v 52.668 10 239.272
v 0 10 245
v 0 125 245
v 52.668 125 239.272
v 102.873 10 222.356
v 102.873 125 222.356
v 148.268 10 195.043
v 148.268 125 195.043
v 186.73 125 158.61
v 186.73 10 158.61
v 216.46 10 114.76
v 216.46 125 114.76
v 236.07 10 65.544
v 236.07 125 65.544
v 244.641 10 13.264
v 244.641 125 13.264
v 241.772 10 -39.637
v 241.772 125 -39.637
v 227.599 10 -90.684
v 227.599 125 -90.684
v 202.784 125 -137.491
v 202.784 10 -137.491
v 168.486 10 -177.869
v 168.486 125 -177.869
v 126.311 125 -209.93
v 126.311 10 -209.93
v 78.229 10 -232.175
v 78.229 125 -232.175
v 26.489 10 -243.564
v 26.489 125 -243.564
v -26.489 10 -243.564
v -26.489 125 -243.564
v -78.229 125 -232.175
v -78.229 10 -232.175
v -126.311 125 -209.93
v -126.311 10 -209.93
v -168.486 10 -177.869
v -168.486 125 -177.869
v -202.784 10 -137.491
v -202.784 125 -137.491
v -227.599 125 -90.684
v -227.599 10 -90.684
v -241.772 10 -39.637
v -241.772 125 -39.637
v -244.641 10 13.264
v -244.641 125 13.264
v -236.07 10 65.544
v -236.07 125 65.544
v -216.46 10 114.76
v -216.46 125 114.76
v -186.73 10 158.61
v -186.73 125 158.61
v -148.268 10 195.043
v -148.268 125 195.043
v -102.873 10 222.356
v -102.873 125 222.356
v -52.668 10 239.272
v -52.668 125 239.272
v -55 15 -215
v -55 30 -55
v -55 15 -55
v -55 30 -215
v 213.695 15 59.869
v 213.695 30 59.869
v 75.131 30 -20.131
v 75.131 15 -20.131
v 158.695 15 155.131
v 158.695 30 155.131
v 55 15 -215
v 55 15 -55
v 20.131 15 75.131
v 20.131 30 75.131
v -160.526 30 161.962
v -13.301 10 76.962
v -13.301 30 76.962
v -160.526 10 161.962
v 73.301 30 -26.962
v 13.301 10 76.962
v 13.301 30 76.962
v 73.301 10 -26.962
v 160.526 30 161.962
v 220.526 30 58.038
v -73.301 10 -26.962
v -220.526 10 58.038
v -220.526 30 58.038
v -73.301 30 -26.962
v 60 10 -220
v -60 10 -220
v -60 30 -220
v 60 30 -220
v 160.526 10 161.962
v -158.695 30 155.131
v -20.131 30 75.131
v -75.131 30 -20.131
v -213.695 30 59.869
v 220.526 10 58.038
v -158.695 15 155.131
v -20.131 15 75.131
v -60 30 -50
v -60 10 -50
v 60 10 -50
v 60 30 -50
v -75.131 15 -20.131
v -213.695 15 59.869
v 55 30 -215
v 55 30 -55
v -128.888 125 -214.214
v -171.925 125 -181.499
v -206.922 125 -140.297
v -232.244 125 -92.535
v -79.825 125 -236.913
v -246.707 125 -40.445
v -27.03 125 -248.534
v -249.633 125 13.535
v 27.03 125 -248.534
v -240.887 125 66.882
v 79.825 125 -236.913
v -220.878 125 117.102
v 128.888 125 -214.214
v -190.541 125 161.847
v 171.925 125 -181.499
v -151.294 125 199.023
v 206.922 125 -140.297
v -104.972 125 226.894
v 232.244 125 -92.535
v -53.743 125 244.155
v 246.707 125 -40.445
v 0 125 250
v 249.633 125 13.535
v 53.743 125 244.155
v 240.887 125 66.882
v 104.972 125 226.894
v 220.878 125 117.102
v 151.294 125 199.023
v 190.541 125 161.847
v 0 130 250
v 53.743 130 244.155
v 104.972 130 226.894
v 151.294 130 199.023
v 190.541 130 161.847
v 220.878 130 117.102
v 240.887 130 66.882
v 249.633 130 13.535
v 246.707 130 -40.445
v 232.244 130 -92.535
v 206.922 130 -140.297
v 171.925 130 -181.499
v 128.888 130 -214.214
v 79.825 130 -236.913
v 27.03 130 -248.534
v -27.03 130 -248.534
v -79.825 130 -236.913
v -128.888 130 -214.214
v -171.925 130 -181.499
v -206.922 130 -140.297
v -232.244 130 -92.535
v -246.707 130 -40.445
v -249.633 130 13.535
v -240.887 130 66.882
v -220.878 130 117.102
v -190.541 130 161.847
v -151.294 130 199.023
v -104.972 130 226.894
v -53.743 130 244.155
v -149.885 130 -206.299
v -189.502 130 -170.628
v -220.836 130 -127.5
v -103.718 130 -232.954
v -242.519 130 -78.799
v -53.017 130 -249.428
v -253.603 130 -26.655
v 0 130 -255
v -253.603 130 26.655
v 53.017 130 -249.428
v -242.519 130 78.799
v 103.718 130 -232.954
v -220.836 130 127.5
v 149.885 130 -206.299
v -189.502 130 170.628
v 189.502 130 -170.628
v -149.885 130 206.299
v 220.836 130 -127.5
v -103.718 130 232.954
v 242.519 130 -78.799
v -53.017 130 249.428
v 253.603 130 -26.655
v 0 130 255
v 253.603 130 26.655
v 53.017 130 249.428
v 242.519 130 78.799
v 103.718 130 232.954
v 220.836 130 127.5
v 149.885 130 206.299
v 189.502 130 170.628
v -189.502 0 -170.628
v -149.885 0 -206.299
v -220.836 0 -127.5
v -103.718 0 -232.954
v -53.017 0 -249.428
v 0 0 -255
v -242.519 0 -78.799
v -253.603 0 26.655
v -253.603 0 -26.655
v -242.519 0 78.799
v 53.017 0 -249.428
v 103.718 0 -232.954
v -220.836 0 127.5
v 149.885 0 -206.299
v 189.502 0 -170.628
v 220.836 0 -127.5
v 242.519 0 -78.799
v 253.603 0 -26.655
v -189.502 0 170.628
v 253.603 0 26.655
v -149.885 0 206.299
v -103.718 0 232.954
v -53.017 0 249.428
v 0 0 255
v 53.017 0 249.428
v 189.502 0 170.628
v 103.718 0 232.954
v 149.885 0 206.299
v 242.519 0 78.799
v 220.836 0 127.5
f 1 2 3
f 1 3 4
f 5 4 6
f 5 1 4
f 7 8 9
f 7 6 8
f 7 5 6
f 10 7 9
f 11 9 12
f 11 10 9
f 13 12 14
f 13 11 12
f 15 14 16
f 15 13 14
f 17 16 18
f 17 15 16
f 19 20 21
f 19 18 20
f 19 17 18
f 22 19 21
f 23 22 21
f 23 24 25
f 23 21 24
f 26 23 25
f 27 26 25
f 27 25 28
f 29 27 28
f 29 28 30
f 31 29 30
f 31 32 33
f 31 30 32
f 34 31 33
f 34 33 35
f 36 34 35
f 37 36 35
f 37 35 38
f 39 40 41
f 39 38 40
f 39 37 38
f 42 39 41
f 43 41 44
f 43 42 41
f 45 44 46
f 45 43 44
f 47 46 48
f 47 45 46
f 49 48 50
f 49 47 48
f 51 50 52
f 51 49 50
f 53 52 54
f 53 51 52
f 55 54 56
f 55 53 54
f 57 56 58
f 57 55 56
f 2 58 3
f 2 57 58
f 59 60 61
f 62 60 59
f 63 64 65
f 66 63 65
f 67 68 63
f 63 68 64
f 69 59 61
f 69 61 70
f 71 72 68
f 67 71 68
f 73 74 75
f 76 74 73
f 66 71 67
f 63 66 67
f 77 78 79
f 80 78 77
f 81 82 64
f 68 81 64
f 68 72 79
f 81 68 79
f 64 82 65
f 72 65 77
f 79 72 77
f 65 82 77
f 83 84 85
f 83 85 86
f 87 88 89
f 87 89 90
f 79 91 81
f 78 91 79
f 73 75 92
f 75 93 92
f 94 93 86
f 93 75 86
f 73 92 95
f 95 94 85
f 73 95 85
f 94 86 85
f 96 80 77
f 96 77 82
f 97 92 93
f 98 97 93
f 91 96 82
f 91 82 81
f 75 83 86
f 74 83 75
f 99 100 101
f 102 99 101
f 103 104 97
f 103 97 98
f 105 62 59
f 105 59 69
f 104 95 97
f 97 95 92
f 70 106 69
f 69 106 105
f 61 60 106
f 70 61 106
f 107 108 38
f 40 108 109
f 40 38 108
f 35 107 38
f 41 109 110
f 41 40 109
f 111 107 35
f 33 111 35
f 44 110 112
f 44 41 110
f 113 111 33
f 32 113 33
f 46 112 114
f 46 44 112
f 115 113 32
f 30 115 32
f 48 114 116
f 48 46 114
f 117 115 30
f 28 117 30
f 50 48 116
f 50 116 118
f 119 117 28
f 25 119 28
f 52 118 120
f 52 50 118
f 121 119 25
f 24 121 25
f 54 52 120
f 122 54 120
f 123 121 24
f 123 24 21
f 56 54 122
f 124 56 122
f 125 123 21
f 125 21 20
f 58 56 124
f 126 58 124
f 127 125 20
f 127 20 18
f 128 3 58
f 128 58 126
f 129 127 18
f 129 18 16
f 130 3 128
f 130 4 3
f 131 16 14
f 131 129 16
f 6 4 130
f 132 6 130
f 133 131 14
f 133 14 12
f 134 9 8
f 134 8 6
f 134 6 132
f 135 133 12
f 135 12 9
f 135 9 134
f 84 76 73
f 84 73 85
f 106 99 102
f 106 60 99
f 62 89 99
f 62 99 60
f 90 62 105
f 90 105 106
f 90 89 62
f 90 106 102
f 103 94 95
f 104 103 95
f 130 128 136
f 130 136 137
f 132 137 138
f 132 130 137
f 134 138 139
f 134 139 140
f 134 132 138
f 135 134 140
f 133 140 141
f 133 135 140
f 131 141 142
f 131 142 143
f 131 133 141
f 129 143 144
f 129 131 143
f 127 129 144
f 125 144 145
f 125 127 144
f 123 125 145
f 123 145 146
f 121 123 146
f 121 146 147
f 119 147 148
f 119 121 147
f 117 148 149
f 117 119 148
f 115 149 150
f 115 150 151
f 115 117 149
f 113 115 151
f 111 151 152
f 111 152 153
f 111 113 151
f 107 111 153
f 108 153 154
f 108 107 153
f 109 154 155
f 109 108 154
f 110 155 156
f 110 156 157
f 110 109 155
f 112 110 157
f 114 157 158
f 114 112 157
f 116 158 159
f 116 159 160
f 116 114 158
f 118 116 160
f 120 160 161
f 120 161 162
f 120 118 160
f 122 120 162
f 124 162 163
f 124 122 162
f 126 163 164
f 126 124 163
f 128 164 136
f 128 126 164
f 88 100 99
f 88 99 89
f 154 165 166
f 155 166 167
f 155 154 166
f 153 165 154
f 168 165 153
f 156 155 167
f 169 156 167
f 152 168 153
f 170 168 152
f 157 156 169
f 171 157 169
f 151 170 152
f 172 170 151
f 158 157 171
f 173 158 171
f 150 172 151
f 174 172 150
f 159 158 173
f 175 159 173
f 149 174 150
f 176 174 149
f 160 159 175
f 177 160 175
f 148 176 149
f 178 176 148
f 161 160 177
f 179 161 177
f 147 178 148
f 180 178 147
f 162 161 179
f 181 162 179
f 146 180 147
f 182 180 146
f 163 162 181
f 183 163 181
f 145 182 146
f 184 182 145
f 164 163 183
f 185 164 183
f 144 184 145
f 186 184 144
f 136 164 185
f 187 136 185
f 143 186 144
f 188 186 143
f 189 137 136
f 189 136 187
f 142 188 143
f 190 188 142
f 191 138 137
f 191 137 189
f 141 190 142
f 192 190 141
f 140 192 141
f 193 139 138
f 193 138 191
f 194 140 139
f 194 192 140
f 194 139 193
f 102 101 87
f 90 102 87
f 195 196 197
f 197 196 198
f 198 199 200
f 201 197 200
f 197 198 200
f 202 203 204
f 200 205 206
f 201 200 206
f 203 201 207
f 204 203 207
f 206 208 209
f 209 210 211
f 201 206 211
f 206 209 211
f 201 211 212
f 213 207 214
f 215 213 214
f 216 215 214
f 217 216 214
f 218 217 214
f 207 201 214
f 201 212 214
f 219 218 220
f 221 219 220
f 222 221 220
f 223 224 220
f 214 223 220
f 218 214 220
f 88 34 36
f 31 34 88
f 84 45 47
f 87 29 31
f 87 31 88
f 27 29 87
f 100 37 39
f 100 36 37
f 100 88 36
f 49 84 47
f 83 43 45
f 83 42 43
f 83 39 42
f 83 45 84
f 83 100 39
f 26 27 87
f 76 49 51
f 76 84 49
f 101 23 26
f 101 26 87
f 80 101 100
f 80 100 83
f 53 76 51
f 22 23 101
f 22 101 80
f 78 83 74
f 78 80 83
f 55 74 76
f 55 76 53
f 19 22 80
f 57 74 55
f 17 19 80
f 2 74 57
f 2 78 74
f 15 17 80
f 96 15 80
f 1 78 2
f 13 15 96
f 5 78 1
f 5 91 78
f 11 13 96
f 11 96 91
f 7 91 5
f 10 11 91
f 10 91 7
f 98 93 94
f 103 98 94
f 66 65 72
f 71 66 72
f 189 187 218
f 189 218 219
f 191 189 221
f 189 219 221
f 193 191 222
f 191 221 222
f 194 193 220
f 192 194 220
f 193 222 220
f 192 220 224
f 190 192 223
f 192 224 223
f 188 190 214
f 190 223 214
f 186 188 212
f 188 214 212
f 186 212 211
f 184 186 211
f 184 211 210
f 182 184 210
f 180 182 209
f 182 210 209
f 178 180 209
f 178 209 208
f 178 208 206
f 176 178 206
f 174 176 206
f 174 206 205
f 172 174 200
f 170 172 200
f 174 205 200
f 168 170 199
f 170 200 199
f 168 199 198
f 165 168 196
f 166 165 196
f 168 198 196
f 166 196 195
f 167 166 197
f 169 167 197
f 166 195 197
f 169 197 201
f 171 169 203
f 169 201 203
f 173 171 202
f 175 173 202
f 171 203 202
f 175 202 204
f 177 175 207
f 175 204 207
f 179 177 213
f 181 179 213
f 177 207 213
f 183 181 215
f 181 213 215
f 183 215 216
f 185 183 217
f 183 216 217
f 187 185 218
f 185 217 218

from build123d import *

# Parameters (mm, degrees)
SKETCH1_R           = 255
BOSS_EXTRUDE1_DEPTH = 125
SHELL1_T            = -10
SKETCH3_W           = 120
SKETCH3_H           = 170
BOSS_EXTRUDE3_DEPTH = 20
SKETCH2_R           = 255
SKETCH2_R_2         = 250
BOSS_EXTRUDE2_DEPTH = 5
SKETCH5_W           = 110
SKETCH5_H           = 160
CUT_EXTRUDE1_DEPTH  = 15


with BuildPart() as part:
    # Sketch1 → Boss-Extrude1 (new body)
    with BuildSketch(Plane(origin=(0, 0, 0), x_dir=(1, 0, 0), z_dir=(0, 1, 0))):
        with Locations(Location((0, 0, 0), (0, 0, 270))):
            Circle(SKETCH1_R)
    extrude(amount=BOSS_EXTRUDE1_DEPTH)

    # Shell1
    shell1_openings = [part.faces().sort_by_distance(p)[0] for p in [
        (0, 125, 0),
    ]]
    offset(amount=SHELL1_T, openings=shell1_openings, kind=Kind.INTERSECTION)

    # Sketch3 → Boss-Extrude3 (add)
    with BuildSketch(Plane(origin=(0, 10, 0), x_dir=(1, 0, 0), z_dir=(0, 1, 0))):
        with Locations((0, 135)):
            Rectangle(SKETCH3_W, SKETCH3_H)
        Polygon((73.301270189, 26.961524227), (220.525588833, -58.038475773), (160.525588833, -161.961524227), (13.301270189, -76.961524227), align=None)
        Polygon((-13.301270189, -76.961524227), (-160.525588833, -161.961524227), (-220.525588833, -58.038475773), (-73.301270189, 26.961524227), align=None)
    extrude(amount=BOSS_EXTRUDE3_DEPTH)

    # Sketch2 → Boss-Extrude2 (add)
    with BuildSketch(Plane(origin=(0, 125, 0), x_dir=(1, 0, 0), z_dir=(0, 1, 0))):
        with Locations(Location((0, 0, 0), (0, 0, 270))):
            Circle(SKETCH2_R)
        with Locations(Location((0, 0, 0), (0, 0, 270))):
            Circle(SKETCH2_R_2, mode=Mode.SUBTRACT)
    extrude(amount=BOSS_EXTRUDE2_DEPTH)

    # Sketch5 → Cut-Extrude1 (cut)
    with BuildSketch(Plane(origin=(0, 30, 0), x_dir=(1, 0, 0), z_dir=(0, 1, 0))):
        Polygon((20.131397208, -75.131397208), (158.695461814, -155.131397208), (213.695461814, -59.868602792), (75.131397208, 20.131397208), align=None)
        with Locations((0, 135)):
            Rectangle(SKETCH5_W, SKETCH5_H)
        Polygon((-75.131397208, 20.131397208), (-213.695461814, -59.868602792), (-158.695461814, -155.131397208), (-20.131397208, -75.131397208), align=None)
    extrude(amount=-CUT_EXTRUDE1_DEPTH, mode=Mode.SUBTRACT)


solid = part.part
